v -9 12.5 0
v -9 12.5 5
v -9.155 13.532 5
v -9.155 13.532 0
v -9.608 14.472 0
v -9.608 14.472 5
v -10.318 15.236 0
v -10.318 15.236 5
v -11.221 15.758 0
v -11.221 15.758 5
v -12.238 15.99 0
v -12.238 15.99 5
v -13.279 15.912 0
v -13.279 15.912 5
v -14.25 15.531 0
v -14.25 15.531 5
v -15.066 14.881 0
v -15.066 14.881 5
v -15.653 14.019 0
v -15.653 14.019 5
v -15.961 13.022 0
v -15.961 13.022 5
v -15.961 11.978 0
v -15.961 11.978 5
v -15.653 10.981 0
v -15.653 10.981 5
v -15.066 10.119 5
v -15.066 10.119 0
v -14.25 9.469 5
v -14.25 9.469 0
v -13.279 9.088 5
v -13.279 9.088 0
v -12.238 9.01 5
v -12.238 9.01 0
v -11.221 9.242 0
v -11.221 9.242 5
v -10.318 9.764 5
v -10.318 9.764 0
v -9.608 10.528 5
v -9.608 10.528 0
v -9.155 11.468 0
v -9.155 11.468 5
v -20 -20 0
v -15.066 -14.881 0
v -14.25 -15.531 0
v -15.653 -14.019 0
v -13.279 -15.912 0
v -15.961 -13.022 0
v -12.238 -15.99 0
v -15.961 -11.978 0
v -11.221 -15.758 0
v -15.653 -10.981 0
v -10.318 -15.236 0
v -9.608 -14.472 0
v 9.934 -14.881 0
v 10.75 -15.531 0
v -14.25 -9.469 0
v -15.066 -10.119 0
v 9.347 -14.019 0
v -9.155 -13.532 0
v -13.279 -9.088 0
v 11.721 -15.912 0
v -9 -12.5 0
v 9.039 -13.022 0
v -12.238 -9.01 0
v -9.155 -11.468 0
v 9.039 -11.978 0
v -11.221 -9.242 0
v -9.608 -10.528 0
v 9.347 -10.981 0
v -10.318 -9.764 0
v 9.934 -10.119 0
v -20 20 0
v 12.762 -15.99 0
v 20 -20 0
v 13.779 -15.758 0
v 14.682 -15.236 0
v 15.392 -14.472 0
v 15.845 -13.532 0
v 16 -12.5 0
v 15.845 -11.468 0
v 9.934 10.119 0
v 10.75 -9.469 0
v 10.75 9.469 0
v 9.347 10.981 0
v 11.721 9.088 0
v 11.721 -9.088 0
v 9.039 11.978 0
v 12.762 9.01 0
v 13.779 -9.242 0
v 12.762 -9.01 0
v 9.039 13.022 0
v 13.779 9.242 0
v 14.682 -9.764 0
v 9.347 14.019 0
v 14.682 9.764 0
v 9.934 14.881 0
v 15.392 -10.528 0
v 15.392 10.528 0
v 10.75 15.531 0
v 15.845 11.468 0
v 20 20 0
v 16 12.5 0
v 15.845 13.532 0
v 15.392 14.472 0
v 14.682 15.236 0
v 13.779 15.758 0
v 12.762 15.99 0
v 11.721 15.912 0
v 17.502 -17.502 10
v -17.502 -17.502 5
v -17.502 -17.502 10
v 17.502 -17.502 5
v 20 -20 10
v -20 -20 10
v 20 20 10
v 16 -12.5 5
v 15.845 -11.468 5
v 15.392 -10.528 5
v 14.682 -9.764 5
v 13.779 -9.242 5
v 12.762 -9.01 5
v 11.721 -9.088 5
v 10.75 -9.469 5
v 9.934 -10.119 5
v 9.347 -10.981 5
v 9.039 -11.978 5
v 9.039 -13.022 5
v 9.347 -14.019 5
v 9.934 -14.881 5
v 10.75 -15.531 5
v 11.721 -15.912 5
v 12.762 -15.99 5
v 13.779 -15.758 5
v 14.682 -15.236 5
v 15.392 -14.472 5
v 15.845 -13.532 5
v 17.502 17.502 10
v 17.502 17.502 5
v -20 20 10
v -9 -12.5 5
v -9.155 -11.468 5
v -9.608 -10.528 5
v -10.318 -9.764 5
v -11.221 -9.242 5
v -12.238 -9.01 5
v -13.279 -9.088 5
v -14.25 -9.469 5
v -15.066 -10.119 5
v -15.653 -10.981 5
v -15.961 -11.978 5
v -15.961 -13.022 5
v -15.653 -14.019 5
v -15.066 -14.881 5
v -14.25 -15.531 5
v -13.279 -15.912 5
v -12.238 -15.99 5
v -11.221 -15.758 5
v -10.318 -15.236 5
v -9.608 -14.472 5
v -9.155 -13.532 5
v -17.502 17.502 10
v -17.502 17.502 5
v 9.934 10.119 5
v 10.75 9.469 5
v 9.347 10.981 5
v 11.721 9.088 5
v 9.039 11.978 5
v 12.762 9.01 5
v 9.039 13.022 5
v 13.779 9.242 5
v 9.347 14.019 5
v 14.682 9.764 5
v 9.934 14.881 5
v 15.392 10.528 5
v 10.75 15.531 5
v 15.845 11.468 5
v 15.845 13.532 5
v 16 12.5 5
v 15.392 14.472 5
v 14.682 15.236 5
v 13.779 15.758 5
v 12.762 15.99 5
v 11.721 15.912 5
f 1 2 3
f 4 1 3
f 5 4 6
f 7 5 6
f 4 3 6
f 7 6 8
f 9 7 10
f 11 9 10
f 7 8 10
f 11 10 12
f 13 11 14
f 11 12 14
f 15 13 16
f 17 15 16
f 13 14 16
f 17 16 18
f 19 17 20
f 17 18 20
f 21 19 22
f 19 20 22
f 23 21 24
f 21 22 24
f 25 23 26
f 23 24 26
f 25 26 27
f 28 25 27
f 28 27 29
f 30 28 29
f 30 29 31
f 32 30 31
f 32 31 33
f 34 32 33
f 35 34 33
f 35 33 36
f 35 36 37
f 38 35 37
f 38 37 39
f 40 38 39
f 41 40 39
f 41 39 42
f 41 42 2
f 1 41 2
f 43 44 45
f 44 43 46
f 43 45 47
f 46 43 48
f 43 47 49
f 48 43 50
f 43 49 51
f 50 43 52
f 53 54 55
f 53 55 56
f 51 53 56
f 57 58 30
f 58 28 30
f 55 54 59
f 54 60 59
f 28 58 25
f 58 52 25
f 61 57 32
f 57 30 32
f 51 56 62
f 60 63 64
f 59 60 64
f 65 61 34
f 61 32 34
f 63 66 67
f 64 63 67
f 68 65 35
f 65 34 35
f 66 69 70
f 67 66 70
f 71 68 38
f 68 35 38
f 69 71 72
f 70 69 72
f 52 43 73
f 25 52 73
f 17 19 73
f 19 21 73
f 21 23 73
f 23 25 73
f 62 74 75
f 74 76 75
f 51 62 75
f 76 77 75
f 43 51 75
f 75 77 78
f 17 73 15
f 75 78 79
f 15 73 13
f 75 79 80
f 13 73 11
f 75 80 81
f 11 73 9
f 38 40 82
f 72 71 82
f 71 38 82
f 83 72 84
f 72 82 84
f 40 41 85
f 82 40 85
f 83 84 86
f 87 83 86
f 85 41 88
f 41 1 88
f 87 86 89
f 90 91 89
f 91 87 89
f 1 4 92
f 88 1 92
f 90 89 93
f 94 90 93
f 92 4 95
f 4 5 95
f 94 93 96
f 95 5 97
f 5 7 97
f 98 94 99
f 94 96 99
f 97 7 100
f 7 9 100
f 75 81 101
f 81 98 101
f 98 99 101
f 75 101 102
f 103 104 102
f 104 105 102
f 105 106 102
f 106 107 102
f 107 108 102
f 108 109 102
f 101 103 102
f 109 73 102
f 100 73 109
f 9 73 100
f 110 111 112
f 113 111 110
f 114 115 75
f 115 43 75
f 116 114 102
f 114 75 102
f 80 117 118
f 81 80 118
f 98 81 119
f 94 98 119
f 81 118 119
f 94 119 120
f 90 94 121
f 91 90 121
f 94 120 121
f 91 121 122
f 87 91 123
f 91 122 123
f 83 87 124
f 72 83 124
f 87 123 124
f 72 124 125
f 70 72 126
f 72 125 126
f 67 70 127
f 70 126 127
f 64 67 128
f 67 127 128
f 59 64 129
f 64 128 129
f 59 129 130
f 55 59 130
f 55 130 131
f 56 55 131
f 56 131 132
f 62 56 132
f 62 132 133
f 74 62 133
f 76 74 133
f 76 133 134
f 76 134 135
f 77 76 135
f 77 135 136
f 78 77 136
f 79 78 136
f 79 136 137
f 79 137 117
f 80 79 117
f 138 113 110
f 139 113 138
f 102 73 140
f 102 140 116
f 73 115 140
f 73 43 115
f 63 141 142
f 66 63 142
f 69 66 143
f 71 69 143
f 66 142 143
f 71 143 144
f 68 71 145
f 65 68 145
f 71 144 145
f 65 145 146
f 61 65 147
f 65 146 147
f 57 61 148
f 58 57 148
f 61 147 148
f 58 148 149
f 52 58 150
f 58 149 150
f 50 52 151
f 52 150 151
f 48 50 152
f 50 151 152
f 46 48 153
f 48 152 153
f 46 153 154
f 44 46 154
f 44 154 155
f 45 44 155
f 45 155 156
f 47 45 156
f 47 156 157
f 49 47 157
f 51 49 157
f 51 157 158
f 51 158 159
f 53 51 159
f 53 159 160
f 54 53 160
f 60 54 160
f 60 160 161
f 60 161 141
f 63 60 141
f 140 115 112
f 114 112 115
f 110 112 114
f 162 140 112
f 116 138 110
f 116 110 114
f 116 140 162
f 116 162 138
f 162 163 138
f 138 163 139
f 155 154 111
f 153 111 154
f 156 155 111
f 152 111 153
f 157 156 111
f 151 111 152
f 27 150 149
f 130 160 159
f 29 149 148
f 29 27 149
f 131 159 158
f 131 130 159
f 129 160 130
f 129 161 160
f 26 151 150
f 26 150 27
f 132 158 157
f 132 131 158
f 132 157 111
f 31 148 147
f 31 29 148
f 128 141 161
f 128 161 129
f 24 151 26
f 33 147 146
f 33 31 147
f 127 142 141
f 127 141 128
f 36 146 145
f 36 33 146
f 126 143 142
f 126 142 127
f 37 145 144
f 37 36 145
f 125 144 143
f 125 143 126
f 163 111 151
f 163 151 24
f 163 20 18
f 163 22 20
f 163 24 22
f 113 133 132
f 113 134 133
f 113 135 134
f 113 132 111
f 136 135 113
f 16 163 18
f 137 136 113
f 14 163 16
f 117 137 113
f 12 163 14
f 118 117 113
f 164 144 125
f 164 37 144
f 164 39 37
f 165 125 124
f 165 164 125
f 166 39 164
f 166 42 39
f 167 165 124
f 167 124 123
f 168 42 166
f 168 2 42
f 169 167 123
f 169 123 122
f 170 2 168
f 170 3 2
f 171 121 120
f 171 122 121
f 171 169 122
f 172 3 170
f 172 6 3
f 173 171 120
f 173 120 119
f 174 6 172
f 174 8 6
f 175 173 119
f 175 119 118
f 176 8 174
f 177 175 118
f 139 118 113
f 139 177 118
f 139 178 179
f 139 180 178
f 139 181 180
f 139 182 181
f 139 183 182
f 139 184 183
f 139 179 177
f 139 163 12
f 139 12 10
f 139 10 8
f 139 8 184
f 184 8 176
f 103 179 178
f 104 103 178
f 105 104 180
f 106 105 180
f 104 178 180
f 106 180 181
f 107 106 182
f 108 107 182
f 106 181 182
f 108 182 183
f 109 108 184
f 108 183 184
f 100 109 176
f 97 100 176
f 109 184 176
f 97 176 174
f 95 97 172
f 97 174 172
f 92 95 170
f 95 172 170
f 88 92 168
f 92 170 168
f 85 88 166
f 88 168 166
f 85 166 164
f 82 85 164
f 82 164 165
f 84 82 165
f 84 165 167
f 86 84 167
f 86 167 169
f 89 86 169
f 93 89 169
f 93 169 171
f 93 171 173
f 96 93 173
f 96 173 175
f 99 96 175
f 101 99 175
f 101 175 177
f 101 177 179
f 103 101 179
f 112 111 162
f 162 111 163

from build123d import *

# Parameters (mm, degrees)
CROQUIS4_W              = 40
CROQUIS4_H              = 40
SALIENTE_EXTRUIR7_DEPTH = 5
CROQUIS5_W              = 40
CROQUIS5_H              = 40
CROQUIS5_W_2            = 35.003943974
CROQUIS5_H_2            = 35.003943974
SALIENTE_EXTRUIR8_DEPTH = 5
CROQUIS6_R              = 3.5
CORTAR_EXTRUIR1_DEPTH   = 13


with BuildPart() as part:
    # Croquis4 → Saliente-Extruir7 (new body)
    with BuildSketch(Plane.XY):
        Rectangle(CROQUIS4_W, CROQUIS4_H)
    extrude(amount=SALIENTE_EXTRUIR7_DEPTH)

    # Croquis5 → Saliente-Extruir8 (add)
    with BuildSketch(Plane.XY.offset(5)):
        Rectangle(CROQUIS5_W, CROQUIS5_H)
        Rectangle(CROQUIS5_W_2, CROQUIS5_H_2, mode=Mode.SUBTRACT)
    extrude(amount=SALIENTE_EXTRUIR8_DEPTH)

    # Croquis6 → Cortar-Extruir1 (cut)
    with BuildSketch(Plane.XY.offset(5)):
        with Locations((-12.5, 12.5)):
            Circle(CROQUIS6_R)
        with Locations((12.5, 12.5)):
            Circle(CROQUIS6_R)
        with Locations((-12.5, -12.5)):
            Circle(CROQUIS6_R)
        with Locations((12.5, -12.5)):
            Circle(CROQUIS6_R)
    extrude(amount=-CORTAR_EXTRUIR1_DEPTH, mode=Mode.SUBTRACT)


solid = part.part
